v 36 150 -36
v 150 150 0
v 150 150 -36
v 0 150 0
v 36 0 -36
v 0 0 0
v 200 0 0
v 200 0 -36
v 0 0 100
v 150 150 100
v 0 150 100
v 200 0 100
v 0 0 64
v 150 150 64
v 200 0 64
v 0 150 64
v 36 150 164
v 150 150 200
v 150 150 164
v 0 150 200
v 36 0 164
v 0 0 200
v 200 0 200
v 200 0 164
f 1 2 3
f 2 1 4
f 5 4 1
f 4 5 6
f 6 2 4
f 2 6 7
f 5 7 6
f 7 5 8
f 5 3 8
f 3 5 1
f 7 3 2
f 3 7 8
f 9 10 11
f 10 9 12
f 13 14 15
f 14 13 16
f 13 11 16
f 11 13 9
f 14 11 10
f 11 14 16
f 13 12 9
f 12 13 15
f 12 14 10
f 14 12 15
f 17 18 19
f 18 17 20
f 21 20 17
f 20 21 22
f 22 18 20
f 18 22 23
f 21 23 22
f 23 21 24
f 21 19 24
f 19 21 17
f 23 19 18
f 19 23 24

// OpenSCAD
// file: util.scad
// Massstab 1 entspricht einem cm

module cutpart(length, height, depth) {
	polyhedron ( points = [
			[0, height, -depth], 
			[0, 0, -depth], 
			[length, 0, -depth], 
			[0, height, 0], 
			[0, 0, 0], 
			[length, 0, 0], ], 
		triangles = [
			[0, 1, 2], 
			[0, 5, 3],
			[4, 1, 0],
			[0, 3, 4],
			[5, 3, 0],
			[0, 2, 5],
			[4, 2, 1],
			[2, 4, 5],
			[5, 4, 3], ]);
}

module antiprism(height, depth) {
	polyhedron ( points = [
			[0, height, 0], 
			[0, height, depth], 
			[depth, height, depth], 
			[0, 0, 0], 
			[0, 0, depth], 
			[depth, 0, depth], ], 
		triangles = [
			[2, 1, 0], 
			[3, 5, 0],
			[0, 1, 4],
			[4, 3, 0],
			[0, 3, 5],
			[5, 2, 0],
			[1, 2, 4],
			[5, 4, 2],
			[3, 4, 5], ]);
}

antiprism (150, 36);

translate([0, 0, 100])
	cutpart (200, 150, 36);
// main file
// Massstab 1 entspricht einem cm
use<util.scad>

module cutwall(baseLength, cutLength, height, depth, phased) {
	aPhased = 
		(phased == undef) ? true : phased;
	aBaseLength = 
		(aPhased) ? 
			baseLength - depth : baseLength;
	aCutLength = 
		(aPhased) ? 
			cutLength - depth : cutLength;

	union() {
		if(aPhased) {
			rotate([0, 90, 0])
				antiprism(height, depth);
			translate ([depth, 0, -depth])	
				cube(size = [aCutLength, height,
					depth]);	
		} else {
			translate ([0, 0, -depth])	
				cube(size = [aCutLength, height, 
					depth]);	
		}

		translate([cutLength, 0, 0])
			cutpart(aBaseLength - aCutLength, height, depth);
	}
}


cutwall (200, 150, 150, 36);

translate([0, 0, 100])
	cutwall (200, 150, 150, 36, false);

translate([0, 0, 200])
		cutwall (200, 150, 150, 36, true);
